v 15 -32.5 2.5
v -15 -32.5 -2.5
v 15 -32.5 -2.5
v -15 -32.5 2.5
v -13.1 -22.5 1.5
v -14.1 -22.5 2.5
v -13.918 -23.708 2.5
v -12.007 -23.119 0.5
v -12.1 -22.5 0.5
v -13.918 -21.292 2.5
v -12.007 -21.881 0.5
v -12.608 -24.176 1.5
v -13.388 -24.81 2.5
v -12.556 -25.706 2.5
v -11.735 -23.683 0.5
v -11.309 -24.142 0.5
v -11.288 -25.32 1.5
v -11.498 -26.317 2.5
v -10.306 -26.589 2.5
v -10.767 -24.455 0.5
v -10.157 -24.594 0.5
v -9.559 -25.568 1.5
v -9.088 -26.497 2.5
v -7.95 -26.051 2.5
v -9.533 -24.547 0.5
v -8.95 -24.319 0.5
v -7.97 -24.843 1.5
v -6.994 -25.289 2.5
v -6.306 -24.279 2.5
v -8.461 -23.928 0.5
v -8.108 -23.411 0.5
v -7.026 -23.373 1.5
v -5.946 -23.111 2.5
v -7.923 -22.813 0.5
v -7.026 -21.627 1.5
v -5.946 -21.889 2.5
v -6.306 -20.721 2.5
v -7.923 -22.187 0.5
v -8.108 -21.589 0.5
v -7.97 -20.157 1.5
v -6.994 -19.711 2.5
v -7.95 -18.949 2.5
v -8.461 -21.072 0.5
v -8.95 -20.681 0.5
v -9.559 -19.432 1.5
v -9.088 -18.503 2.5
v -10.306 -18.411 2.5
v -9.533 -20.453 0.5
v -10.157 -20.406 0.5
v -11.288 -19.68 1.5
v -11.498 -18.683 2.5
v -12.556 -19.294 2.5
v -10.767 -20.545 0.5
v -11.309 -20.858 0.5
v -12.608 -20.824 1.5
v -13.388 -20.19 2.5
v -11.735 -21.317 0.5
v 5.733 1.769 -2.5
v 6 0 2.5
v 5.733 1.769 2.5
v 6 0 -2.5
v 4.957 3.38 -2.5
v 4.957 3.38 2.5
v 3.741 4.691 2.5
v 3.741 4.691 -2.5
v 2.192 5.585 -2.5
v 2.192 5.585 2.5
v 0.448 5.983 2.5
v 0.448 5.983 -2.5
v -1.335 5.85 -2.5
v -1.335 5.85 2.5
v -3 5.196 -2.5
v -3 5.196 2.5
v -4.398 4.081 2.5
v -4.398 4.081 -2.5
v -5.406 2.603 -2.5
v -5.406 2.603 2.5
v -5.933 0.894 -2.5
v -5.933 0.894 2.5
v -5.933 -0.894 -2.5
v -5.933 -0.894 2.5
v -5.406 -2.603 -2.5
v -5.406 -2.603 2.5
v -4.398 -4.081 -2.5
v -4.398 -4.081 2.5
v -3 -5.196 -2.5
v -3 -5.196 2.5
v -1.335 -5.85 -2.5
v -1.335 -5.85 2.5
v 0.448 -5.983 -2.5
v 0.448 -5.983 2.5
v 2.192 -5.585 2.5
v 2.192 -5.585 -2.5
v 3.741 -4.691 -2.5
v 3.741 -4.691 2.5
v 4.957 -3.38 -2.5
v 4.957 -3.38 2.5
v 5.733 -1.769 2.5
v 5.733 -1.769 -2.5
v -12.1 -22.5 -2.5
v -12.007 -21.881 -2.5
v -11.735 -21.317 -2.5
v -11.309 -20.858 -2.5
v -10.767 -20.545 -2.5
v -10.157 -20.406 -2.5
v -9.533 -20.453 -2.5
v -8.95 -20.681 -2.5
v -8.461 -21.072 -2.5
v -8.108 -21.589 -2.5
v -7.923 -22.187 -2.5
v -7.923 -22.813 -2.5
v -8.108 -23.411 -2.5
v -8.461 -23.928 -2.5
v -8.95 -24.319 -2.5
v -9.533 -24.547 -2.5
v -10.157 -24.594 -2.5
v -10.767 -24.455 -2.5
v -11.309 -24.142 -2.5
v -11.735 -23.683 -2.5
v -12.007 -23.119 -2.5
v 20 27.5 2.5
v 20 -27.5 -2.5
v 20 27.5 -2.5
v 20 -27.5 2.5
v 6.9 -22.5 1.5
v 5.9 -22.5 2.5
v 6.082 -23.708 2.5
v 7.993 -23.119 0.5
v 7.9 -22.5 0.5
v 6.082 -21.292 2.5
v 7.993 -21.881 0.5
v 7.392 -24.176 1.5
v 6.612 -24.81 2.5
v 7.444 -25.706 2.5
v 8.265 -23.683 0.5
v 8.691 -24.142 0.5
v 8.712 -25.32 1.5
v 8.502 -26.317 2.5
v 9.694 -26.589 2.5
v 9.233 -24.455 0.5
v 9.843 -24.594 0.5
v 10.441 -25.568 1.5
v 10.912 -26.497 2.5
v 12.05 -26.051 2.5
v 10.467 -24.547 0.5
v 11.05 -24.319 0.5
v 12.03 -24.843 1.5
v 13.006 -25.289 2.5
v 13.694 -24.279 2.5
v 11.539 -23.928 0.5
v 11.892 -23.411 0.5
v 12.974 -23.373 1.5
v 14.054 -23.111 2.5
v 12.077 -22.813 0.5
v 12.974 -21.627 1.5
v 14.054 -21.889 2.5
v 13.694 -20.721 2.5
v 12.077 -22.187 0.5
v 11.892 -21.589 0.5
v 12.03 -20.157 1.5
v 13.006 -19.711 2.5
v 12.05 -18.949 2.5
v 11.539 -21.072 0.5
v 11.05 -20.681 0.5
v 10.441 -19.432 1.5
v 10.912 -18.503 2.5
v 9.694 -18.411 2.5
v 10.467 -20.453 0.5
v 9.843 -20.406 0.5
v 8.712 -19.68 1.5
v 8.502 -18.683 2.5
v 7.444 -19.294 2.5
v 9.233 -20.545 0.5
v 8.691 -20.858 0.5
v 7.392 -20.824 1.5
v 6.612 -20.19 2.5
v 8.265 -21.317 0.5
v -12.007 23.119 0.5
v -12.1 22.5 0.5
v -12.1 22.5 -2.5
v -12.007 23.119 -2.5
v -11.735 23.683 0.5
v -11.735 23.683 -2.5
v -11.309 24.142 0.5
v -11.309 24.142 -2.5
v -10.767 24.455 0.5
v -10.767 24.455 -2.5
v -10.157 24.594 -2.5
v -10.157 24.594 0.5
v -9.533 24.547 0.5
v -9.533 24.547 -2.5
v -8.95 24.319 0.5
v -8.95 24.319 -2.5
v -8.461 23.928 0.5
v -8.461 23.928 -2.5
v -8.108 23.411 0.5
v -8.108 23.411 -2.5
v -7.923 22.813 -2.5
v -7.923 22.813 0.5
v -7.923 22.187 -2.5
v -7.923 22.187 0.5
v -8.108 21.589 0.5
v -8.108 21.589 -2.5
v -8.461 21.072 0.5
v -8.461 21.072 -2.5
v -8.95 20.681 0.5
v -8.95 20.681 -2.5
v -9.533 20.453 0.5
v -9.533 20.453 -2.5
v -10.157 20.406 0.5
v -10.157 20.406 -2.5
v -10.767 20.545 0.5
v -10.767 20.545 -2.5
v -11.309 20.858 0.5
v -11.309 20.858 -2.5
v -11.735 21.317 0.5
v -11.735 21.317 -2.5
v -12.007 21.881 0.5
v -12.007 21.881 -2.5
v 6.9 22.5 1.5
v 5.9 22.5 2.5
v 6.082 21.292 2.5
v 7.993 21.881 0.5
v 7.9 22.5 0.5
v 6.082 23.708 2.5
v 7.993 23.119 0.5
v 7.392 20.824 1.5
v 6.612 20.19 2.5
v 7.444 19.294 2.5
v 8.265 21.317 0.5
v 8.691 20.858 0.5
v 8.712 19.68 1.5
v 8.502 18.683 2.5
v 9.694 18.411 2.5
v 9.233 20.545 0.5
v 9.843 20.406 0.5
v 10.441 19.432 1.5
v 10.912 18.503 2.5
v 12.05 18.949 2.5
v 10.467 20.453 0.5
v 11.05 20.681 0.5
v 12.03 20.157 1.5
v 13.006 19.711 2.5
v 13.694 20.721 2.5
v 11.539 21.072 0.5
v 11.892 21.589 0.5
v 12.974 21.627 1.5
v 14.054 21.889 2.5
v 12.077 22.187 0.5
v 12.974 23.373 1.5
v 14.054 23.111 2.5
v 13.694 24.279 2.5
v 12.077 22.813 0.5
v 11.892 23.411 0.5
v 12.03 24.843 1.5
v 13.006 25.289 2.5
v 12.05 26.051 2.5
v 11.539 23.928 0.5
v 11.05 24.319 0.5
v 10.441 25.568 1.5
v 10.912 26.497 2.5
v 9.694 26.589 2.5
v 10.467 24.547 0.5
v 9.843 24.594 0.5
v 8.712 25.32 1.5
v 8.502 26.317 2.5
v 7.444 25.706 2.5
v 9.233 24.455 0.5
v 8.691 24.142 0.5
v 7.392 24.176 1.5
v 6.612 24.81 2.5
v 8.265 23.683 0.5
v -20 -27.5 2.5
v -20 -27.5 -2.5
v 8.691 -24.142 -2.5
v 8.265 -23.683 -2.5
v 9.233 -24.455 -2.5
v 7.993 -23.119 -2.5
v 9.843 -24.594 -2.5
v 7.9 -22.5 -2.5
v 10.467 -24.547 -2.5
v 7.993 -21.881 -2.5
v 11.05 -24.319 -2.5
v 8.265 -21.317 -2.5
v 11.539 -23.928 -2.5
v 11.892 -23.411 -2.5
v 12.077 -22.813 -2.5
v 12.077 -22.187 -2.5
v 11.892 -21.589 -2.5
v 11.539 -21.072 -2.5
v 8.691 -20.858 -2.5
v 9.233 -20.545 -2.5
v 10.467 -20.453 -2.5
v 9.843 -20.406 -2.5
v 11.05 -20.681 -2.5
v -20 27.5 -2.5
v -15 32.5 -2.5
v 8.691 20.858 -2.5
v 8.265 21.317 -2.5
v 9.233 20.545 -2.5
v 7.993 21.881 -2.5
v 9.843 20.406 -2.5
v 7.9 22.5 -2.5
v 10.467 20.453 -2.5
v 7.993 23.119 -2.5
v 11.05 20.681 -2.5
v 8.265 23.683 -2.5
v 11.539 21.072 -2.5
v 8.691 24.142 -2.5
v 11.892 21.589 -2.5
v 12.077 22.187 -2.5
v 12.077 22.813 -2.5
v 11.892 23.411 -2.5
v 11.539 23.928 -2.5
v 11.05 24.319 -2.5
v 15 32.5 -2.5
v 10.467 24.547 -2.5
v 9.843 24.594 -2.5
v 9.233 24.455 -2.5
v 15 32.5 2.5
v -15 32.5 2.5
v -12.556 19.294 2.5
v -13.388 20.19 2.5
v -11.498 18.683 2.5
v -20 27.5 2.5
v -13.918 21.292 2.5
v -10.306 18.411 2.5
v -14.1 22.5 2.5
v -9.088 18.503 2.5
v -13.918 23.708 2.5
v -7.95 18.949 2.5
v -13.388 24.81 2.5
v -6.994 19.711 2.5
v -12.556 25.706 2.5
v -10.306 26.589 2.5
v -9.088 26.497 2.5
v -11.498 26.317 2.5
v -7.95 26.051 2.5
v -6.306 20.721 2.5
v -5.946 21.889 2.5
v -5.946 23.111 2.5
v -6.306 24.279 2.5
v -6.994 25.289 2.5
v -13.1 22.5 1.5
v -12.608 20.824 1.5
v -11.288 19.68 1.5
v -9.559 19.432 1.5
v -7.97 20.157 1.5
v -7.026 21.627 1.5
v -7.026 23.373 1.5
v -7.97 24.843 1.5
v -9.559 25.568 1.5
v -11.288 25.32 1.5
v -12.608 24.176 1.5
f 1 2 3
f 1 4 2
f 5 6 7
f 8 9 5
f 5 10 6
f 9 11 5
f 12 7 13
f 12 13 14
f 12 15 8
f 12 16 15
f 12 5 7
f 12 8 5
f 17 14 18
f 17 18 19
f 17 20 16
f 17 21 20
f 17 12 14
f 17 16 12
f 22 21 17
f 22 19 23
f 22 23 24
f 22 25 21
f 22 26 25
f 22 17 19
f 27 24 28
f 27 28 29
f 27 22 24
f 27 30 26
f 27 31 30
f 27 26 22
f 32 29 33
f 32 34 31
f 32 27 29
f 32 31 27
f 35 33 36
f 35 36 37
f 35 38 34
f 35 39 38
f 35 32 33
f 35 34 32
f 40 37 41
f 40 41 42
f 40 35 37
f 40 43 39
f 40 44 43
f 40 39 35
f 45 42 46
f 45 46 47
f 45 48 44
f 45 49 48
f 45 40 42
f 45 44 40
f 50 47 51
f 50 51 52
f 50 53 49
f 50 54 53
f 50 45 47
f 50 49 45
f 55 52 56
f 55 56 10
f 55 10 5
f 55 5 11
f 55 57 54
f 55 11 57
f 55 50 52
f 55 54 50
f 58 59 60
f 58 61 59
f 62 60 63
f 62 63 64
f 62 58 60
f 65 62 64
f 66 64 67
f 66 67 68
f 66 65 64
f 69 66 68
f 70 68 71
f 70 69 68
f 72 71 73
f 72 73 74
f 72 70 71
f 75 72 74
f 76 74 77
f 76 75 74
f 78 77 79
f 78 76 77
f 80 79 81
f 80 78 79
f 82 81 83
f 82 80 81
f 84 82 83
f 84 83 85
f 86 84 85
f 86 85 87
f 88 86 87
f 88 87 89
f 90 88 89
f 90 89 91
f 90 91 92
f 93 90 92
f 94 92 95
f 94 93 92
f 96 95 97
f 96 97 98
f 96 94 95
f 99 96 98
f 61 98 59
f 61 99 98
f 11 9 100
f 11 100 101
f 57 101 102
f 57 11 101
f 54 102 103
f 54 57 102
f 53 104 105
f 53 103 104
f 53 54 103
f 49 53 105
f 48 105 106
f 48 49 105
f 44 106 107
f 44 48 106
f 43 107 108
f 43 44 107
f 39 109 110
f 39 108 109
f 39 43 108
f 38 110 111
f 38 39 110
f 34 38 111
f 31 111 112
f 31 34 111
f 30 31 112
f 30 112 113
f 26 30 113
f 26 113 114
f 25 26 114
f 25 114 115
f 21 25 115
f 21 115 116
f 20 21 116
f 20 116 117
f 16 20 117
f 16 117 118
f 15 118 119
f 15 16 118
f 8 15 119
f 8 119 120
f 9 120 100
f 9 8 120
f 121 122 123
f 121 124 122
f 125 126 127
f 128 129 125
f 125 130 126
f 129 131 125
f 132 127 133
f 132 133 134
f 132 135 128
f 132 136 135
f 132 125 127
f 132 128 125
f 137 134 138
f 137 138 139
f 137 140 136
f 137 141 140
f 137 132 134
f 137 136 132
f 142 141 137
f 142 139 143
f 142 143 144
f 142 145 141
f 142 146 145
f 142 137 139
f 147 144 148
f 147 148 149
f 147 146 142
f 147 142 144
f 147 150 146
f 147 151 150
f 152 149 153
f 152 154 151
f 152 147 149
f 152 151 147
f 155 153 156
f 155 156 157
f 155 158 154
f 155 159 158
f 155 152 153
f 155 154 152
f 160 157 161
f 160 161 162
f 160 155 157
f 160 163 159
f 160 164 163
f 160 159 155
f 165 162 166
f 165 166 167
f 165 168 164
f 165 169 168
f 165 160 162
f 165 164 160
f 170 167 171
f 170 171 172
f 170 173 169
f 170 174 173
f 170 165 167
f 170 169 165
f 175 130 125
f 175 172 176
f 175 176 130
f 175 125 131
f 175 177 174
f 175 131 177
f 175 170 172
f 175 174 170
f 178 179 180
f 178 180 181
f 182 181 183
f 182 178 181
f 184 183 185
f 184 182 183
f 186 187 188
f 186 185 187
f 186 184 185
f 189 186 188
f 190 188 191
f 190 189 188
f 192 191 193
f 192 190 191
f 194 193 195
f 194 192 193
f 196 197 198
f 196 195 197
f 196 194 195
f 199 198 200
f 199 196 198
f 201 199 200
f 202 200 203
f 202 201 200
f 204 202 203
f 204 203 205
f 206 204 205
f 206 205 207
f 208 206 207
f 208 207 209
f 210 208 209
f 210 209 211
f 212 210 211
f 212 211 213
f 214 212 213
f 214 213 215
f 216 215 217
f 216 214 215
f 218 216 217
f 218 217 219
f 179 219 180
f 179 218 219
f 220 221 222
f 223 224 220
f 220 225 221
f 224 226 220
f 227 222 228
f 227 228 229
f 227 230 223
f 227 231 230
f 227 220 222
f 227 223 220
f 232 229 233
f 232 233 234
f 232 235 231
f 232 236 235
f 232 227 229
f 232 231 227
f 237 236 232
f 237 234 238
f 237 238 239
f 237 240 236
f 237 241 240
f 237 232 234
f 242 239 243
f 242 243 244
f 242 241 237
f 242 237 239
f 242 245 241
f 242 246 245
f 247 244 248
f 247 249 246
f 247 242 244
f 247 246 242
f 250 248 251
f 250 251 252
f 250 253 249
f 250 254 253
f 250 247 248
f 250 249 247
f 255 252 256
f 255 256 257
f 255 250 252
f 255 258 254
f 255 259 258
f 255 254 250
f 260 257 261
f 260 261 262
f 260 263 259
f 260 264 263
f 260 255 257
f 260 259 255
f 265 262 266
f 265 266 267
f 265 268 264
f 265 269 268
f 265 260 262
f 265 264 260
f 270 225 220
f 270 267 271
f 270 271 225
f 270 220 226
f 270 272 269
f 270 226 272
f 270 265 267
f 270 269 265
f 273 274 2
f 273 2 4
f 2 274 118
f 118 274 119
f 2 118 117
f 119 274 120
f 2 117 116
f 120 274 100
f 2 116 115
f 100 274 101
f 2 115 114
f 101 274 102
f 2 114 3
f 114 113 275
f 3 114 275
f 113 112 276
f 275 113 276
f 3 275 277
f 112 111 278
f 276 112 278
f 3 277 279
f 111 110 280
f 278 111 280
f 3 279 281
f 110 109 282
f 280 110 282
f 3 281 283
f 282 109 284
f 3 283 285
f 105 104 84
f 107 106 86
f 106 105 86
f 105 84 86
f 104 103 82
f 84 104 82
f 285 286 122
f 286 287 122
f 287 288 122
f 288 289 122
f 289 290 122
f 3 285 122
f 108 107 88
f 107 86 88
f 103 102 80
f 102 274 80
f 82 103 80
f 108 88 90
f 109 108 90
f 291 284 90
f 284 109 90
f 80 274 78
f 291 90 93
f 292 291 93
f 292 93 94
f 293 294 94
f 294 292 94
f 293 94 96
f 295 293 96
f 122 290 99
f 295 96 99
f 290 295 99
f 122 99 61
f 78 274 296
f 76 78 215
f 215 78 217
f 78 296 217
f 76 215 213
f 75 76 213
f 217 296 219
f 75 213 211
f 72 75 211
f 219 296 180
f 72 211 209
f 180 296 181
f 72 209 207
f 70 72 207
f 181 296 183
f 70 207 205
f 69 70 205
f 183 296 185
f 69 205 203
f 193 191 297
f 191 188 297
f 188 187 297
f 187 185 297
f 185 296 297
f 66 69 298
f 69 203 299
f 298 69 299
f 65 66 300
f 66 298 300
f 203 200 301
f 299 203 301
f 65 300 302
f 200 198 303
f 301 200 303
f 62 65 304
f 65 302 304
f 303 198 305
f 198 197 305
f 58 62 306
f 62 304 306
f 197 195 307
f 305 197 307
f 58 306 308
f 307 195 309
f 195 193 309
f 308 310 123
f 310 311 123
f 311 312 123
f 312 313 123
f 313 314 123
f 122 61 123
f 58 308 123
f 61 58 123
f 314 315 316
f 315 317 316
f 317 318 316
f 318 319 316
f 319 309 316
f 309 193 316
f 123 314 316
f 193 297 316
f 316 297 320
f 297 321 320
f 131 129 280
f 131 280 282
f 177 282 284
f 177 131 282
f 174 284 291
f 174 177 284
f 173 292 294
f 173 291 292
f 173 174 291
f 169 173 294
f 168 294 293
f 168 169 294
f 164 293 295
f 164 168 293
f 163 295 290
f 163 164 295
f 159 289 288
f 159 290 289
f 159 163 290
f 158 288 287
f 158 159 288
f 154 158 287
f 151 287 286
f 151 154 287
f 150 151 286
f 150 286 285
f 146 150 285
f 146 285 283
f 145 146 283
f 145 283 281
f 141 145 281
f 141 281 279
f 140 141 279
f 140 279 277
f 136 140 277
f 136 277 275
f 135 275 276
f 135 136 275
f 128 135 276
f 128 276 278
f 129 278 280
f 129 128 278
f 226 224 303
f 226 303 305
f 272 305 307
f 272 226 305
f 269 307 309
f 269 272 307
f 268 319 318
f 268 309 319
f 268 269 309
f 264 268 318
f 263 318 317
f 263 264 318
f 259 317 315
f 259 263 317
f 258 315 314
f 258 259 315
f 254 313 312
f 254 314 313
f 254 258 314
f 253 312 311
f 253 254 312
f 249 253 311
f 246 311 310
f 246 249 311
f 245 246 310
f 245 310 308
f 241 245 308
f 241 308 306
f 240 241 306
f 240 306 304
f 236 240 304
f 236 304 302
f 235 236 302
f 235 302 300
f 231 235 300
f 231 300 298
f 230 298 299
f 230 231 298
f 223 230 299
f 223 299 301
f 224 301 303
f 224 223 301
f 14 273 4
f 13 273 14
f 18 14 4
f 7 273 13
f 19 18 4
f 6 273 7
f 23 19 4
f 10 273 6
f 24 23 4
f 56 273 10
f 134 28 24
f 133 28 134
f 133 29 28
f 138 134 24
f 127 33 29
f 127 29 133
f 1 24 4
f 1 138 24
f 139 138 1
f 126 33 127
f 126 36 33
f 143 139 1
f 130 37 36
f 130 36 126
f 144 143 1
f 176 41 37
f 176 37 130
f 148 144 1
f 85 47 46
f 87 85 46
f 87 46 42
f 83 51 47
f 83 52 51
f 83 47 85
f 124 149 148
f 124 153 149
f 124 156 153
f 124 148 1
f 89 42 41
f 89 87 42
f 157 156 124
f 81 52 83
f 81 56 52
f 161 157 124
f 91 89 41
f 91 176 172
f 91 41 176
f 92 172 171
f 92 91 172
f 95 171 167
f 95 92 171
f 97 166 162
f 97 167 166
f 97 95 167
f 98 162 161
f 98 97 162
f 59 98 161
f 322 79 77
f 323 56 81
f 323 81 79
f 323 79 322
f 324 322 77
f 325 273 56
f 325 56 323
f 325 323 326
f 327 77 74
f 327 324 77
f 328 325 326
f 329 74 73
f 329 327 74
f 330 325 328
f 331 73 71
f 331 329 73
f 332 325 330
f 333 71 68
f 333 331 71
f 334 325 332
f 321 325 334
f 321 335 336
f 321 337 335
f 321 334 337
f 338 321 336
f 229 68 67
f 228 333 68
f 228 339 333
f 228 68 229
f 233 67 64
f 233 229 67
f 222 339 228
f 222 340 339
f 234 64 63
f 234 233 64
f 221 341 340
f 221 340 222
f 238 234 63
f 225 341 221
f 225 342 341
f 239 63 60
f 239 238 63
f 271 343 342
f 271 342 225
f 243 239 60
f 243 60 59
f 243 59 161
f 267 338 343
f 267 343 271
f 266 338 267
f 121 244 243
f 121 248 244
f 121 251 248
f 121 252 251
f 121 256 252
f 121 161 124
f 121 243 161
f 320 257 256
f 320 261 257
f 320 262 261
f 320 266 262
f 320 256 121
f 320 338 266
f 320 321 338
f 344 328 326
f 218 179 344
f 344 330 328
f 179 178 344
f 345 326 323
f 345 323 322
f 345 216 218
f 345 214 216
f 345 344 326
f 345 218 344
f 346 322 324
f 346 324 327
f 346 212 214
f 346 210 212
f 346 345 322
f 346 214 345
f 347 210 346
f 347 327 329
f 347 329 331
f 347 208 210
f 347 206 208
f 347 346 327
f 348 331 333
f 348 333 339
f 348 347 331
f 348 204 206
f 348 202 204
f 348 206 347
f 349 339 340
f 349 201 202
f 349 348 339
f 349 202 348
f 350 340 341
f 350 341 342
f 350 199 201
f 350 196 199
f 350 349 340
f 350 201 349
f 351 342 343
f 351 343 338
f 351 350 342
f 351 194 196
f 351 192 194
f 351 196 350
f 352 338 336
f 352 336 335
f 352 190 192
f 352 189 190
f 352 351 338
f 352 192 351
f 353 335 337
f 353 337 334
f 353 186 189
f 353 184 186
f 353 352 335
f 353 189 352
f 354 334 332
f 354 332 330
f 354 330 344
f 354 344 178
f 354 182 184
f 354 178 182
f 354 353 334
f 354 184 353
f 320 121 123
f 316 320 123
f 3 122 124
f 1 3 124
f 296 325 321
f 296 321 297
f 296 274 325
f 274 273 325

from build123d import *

# Parameters (mm, degrees)
SKETCH_1_W               = 40
SKETCH_1_H               = 65
SKETCH_1_R               = 6
EXTRUDE_1_DEPTH          = 2.5
CUT_EXTRUDE_1_DEPTH      = 39.487010796
CUT_EXTRUDE_1_DEPTH_BACK = 39.487010796
SKETCH_2_R               = 2.1
CHAMFER_1_SIZE           = 2
CHAMFER_2_SIZE           = 5


with BuildPart() as part:
    # 草图1 → 凸台-拉伸1 (new, symmetric)
    with BuildSketch(Plane.XY):
        Rectangle(SKETCH_1_W, SKETCH_1_H)
        Circle(SKETCH_1_R, mode=Mode.SUBTRACT)
    extrude(amount=EXTRUDE_1_DEPTH, both=True)

    # 草图2 → 切除-拉伸1 (cut, two sides: drawn at the far end of the back side and taken through both)
    with BuildSketch(Plane(origin=(0, 0, -2.5), x_dir=(-1, 0, 0), z_dir=(0, 0, -1)).offset(-CUT_EXTRUDE_1_DEPTH_BACK)):
        with Locations((-10, 22.5)):
            Circle(SKETCH_2_R)
        with Locations((10, 22.5)):
            Circle(SKETCH_2_R)
        with Locations((10, -22.5)):
            Circle(SKETCH_2_R)
        with Locations((-10, -22.5)):
            Circle(SKETCH_2_R)
    extrude(amount=CUT_EXTRUDE_1_DEPTH + CUT_EXTRUDE_1_DEPTH_BACK, mode=Mode.SUBTRACT)

    # 倒角1
    chamfer_1_edges = [part.edges().sort_by_distance(p)[0] for p in [
        (12.1, -22.5, 2.5),
        (-7.9, -22.5, 2.5),
        (-7.9, 22.5, 2.5),
        (12.1, 22.5, 2.5),
    ]]
    chamfer(chamfer_1_edges, length=CHAMFER_1_SIZE)

    # 倒角2
    chamfer_2_edges = [part.edges().sort_by_distance(p)[0] for p in [
        (-20, 32.5, 0),
        (20, 32.5, 0),
        (20, -32.5, 0),
        (-20, -32.5, 0),
    ]]
    chamfer(chamfer_2_edges, length=CHAMFER_2_SIZE)


solid = part.part
